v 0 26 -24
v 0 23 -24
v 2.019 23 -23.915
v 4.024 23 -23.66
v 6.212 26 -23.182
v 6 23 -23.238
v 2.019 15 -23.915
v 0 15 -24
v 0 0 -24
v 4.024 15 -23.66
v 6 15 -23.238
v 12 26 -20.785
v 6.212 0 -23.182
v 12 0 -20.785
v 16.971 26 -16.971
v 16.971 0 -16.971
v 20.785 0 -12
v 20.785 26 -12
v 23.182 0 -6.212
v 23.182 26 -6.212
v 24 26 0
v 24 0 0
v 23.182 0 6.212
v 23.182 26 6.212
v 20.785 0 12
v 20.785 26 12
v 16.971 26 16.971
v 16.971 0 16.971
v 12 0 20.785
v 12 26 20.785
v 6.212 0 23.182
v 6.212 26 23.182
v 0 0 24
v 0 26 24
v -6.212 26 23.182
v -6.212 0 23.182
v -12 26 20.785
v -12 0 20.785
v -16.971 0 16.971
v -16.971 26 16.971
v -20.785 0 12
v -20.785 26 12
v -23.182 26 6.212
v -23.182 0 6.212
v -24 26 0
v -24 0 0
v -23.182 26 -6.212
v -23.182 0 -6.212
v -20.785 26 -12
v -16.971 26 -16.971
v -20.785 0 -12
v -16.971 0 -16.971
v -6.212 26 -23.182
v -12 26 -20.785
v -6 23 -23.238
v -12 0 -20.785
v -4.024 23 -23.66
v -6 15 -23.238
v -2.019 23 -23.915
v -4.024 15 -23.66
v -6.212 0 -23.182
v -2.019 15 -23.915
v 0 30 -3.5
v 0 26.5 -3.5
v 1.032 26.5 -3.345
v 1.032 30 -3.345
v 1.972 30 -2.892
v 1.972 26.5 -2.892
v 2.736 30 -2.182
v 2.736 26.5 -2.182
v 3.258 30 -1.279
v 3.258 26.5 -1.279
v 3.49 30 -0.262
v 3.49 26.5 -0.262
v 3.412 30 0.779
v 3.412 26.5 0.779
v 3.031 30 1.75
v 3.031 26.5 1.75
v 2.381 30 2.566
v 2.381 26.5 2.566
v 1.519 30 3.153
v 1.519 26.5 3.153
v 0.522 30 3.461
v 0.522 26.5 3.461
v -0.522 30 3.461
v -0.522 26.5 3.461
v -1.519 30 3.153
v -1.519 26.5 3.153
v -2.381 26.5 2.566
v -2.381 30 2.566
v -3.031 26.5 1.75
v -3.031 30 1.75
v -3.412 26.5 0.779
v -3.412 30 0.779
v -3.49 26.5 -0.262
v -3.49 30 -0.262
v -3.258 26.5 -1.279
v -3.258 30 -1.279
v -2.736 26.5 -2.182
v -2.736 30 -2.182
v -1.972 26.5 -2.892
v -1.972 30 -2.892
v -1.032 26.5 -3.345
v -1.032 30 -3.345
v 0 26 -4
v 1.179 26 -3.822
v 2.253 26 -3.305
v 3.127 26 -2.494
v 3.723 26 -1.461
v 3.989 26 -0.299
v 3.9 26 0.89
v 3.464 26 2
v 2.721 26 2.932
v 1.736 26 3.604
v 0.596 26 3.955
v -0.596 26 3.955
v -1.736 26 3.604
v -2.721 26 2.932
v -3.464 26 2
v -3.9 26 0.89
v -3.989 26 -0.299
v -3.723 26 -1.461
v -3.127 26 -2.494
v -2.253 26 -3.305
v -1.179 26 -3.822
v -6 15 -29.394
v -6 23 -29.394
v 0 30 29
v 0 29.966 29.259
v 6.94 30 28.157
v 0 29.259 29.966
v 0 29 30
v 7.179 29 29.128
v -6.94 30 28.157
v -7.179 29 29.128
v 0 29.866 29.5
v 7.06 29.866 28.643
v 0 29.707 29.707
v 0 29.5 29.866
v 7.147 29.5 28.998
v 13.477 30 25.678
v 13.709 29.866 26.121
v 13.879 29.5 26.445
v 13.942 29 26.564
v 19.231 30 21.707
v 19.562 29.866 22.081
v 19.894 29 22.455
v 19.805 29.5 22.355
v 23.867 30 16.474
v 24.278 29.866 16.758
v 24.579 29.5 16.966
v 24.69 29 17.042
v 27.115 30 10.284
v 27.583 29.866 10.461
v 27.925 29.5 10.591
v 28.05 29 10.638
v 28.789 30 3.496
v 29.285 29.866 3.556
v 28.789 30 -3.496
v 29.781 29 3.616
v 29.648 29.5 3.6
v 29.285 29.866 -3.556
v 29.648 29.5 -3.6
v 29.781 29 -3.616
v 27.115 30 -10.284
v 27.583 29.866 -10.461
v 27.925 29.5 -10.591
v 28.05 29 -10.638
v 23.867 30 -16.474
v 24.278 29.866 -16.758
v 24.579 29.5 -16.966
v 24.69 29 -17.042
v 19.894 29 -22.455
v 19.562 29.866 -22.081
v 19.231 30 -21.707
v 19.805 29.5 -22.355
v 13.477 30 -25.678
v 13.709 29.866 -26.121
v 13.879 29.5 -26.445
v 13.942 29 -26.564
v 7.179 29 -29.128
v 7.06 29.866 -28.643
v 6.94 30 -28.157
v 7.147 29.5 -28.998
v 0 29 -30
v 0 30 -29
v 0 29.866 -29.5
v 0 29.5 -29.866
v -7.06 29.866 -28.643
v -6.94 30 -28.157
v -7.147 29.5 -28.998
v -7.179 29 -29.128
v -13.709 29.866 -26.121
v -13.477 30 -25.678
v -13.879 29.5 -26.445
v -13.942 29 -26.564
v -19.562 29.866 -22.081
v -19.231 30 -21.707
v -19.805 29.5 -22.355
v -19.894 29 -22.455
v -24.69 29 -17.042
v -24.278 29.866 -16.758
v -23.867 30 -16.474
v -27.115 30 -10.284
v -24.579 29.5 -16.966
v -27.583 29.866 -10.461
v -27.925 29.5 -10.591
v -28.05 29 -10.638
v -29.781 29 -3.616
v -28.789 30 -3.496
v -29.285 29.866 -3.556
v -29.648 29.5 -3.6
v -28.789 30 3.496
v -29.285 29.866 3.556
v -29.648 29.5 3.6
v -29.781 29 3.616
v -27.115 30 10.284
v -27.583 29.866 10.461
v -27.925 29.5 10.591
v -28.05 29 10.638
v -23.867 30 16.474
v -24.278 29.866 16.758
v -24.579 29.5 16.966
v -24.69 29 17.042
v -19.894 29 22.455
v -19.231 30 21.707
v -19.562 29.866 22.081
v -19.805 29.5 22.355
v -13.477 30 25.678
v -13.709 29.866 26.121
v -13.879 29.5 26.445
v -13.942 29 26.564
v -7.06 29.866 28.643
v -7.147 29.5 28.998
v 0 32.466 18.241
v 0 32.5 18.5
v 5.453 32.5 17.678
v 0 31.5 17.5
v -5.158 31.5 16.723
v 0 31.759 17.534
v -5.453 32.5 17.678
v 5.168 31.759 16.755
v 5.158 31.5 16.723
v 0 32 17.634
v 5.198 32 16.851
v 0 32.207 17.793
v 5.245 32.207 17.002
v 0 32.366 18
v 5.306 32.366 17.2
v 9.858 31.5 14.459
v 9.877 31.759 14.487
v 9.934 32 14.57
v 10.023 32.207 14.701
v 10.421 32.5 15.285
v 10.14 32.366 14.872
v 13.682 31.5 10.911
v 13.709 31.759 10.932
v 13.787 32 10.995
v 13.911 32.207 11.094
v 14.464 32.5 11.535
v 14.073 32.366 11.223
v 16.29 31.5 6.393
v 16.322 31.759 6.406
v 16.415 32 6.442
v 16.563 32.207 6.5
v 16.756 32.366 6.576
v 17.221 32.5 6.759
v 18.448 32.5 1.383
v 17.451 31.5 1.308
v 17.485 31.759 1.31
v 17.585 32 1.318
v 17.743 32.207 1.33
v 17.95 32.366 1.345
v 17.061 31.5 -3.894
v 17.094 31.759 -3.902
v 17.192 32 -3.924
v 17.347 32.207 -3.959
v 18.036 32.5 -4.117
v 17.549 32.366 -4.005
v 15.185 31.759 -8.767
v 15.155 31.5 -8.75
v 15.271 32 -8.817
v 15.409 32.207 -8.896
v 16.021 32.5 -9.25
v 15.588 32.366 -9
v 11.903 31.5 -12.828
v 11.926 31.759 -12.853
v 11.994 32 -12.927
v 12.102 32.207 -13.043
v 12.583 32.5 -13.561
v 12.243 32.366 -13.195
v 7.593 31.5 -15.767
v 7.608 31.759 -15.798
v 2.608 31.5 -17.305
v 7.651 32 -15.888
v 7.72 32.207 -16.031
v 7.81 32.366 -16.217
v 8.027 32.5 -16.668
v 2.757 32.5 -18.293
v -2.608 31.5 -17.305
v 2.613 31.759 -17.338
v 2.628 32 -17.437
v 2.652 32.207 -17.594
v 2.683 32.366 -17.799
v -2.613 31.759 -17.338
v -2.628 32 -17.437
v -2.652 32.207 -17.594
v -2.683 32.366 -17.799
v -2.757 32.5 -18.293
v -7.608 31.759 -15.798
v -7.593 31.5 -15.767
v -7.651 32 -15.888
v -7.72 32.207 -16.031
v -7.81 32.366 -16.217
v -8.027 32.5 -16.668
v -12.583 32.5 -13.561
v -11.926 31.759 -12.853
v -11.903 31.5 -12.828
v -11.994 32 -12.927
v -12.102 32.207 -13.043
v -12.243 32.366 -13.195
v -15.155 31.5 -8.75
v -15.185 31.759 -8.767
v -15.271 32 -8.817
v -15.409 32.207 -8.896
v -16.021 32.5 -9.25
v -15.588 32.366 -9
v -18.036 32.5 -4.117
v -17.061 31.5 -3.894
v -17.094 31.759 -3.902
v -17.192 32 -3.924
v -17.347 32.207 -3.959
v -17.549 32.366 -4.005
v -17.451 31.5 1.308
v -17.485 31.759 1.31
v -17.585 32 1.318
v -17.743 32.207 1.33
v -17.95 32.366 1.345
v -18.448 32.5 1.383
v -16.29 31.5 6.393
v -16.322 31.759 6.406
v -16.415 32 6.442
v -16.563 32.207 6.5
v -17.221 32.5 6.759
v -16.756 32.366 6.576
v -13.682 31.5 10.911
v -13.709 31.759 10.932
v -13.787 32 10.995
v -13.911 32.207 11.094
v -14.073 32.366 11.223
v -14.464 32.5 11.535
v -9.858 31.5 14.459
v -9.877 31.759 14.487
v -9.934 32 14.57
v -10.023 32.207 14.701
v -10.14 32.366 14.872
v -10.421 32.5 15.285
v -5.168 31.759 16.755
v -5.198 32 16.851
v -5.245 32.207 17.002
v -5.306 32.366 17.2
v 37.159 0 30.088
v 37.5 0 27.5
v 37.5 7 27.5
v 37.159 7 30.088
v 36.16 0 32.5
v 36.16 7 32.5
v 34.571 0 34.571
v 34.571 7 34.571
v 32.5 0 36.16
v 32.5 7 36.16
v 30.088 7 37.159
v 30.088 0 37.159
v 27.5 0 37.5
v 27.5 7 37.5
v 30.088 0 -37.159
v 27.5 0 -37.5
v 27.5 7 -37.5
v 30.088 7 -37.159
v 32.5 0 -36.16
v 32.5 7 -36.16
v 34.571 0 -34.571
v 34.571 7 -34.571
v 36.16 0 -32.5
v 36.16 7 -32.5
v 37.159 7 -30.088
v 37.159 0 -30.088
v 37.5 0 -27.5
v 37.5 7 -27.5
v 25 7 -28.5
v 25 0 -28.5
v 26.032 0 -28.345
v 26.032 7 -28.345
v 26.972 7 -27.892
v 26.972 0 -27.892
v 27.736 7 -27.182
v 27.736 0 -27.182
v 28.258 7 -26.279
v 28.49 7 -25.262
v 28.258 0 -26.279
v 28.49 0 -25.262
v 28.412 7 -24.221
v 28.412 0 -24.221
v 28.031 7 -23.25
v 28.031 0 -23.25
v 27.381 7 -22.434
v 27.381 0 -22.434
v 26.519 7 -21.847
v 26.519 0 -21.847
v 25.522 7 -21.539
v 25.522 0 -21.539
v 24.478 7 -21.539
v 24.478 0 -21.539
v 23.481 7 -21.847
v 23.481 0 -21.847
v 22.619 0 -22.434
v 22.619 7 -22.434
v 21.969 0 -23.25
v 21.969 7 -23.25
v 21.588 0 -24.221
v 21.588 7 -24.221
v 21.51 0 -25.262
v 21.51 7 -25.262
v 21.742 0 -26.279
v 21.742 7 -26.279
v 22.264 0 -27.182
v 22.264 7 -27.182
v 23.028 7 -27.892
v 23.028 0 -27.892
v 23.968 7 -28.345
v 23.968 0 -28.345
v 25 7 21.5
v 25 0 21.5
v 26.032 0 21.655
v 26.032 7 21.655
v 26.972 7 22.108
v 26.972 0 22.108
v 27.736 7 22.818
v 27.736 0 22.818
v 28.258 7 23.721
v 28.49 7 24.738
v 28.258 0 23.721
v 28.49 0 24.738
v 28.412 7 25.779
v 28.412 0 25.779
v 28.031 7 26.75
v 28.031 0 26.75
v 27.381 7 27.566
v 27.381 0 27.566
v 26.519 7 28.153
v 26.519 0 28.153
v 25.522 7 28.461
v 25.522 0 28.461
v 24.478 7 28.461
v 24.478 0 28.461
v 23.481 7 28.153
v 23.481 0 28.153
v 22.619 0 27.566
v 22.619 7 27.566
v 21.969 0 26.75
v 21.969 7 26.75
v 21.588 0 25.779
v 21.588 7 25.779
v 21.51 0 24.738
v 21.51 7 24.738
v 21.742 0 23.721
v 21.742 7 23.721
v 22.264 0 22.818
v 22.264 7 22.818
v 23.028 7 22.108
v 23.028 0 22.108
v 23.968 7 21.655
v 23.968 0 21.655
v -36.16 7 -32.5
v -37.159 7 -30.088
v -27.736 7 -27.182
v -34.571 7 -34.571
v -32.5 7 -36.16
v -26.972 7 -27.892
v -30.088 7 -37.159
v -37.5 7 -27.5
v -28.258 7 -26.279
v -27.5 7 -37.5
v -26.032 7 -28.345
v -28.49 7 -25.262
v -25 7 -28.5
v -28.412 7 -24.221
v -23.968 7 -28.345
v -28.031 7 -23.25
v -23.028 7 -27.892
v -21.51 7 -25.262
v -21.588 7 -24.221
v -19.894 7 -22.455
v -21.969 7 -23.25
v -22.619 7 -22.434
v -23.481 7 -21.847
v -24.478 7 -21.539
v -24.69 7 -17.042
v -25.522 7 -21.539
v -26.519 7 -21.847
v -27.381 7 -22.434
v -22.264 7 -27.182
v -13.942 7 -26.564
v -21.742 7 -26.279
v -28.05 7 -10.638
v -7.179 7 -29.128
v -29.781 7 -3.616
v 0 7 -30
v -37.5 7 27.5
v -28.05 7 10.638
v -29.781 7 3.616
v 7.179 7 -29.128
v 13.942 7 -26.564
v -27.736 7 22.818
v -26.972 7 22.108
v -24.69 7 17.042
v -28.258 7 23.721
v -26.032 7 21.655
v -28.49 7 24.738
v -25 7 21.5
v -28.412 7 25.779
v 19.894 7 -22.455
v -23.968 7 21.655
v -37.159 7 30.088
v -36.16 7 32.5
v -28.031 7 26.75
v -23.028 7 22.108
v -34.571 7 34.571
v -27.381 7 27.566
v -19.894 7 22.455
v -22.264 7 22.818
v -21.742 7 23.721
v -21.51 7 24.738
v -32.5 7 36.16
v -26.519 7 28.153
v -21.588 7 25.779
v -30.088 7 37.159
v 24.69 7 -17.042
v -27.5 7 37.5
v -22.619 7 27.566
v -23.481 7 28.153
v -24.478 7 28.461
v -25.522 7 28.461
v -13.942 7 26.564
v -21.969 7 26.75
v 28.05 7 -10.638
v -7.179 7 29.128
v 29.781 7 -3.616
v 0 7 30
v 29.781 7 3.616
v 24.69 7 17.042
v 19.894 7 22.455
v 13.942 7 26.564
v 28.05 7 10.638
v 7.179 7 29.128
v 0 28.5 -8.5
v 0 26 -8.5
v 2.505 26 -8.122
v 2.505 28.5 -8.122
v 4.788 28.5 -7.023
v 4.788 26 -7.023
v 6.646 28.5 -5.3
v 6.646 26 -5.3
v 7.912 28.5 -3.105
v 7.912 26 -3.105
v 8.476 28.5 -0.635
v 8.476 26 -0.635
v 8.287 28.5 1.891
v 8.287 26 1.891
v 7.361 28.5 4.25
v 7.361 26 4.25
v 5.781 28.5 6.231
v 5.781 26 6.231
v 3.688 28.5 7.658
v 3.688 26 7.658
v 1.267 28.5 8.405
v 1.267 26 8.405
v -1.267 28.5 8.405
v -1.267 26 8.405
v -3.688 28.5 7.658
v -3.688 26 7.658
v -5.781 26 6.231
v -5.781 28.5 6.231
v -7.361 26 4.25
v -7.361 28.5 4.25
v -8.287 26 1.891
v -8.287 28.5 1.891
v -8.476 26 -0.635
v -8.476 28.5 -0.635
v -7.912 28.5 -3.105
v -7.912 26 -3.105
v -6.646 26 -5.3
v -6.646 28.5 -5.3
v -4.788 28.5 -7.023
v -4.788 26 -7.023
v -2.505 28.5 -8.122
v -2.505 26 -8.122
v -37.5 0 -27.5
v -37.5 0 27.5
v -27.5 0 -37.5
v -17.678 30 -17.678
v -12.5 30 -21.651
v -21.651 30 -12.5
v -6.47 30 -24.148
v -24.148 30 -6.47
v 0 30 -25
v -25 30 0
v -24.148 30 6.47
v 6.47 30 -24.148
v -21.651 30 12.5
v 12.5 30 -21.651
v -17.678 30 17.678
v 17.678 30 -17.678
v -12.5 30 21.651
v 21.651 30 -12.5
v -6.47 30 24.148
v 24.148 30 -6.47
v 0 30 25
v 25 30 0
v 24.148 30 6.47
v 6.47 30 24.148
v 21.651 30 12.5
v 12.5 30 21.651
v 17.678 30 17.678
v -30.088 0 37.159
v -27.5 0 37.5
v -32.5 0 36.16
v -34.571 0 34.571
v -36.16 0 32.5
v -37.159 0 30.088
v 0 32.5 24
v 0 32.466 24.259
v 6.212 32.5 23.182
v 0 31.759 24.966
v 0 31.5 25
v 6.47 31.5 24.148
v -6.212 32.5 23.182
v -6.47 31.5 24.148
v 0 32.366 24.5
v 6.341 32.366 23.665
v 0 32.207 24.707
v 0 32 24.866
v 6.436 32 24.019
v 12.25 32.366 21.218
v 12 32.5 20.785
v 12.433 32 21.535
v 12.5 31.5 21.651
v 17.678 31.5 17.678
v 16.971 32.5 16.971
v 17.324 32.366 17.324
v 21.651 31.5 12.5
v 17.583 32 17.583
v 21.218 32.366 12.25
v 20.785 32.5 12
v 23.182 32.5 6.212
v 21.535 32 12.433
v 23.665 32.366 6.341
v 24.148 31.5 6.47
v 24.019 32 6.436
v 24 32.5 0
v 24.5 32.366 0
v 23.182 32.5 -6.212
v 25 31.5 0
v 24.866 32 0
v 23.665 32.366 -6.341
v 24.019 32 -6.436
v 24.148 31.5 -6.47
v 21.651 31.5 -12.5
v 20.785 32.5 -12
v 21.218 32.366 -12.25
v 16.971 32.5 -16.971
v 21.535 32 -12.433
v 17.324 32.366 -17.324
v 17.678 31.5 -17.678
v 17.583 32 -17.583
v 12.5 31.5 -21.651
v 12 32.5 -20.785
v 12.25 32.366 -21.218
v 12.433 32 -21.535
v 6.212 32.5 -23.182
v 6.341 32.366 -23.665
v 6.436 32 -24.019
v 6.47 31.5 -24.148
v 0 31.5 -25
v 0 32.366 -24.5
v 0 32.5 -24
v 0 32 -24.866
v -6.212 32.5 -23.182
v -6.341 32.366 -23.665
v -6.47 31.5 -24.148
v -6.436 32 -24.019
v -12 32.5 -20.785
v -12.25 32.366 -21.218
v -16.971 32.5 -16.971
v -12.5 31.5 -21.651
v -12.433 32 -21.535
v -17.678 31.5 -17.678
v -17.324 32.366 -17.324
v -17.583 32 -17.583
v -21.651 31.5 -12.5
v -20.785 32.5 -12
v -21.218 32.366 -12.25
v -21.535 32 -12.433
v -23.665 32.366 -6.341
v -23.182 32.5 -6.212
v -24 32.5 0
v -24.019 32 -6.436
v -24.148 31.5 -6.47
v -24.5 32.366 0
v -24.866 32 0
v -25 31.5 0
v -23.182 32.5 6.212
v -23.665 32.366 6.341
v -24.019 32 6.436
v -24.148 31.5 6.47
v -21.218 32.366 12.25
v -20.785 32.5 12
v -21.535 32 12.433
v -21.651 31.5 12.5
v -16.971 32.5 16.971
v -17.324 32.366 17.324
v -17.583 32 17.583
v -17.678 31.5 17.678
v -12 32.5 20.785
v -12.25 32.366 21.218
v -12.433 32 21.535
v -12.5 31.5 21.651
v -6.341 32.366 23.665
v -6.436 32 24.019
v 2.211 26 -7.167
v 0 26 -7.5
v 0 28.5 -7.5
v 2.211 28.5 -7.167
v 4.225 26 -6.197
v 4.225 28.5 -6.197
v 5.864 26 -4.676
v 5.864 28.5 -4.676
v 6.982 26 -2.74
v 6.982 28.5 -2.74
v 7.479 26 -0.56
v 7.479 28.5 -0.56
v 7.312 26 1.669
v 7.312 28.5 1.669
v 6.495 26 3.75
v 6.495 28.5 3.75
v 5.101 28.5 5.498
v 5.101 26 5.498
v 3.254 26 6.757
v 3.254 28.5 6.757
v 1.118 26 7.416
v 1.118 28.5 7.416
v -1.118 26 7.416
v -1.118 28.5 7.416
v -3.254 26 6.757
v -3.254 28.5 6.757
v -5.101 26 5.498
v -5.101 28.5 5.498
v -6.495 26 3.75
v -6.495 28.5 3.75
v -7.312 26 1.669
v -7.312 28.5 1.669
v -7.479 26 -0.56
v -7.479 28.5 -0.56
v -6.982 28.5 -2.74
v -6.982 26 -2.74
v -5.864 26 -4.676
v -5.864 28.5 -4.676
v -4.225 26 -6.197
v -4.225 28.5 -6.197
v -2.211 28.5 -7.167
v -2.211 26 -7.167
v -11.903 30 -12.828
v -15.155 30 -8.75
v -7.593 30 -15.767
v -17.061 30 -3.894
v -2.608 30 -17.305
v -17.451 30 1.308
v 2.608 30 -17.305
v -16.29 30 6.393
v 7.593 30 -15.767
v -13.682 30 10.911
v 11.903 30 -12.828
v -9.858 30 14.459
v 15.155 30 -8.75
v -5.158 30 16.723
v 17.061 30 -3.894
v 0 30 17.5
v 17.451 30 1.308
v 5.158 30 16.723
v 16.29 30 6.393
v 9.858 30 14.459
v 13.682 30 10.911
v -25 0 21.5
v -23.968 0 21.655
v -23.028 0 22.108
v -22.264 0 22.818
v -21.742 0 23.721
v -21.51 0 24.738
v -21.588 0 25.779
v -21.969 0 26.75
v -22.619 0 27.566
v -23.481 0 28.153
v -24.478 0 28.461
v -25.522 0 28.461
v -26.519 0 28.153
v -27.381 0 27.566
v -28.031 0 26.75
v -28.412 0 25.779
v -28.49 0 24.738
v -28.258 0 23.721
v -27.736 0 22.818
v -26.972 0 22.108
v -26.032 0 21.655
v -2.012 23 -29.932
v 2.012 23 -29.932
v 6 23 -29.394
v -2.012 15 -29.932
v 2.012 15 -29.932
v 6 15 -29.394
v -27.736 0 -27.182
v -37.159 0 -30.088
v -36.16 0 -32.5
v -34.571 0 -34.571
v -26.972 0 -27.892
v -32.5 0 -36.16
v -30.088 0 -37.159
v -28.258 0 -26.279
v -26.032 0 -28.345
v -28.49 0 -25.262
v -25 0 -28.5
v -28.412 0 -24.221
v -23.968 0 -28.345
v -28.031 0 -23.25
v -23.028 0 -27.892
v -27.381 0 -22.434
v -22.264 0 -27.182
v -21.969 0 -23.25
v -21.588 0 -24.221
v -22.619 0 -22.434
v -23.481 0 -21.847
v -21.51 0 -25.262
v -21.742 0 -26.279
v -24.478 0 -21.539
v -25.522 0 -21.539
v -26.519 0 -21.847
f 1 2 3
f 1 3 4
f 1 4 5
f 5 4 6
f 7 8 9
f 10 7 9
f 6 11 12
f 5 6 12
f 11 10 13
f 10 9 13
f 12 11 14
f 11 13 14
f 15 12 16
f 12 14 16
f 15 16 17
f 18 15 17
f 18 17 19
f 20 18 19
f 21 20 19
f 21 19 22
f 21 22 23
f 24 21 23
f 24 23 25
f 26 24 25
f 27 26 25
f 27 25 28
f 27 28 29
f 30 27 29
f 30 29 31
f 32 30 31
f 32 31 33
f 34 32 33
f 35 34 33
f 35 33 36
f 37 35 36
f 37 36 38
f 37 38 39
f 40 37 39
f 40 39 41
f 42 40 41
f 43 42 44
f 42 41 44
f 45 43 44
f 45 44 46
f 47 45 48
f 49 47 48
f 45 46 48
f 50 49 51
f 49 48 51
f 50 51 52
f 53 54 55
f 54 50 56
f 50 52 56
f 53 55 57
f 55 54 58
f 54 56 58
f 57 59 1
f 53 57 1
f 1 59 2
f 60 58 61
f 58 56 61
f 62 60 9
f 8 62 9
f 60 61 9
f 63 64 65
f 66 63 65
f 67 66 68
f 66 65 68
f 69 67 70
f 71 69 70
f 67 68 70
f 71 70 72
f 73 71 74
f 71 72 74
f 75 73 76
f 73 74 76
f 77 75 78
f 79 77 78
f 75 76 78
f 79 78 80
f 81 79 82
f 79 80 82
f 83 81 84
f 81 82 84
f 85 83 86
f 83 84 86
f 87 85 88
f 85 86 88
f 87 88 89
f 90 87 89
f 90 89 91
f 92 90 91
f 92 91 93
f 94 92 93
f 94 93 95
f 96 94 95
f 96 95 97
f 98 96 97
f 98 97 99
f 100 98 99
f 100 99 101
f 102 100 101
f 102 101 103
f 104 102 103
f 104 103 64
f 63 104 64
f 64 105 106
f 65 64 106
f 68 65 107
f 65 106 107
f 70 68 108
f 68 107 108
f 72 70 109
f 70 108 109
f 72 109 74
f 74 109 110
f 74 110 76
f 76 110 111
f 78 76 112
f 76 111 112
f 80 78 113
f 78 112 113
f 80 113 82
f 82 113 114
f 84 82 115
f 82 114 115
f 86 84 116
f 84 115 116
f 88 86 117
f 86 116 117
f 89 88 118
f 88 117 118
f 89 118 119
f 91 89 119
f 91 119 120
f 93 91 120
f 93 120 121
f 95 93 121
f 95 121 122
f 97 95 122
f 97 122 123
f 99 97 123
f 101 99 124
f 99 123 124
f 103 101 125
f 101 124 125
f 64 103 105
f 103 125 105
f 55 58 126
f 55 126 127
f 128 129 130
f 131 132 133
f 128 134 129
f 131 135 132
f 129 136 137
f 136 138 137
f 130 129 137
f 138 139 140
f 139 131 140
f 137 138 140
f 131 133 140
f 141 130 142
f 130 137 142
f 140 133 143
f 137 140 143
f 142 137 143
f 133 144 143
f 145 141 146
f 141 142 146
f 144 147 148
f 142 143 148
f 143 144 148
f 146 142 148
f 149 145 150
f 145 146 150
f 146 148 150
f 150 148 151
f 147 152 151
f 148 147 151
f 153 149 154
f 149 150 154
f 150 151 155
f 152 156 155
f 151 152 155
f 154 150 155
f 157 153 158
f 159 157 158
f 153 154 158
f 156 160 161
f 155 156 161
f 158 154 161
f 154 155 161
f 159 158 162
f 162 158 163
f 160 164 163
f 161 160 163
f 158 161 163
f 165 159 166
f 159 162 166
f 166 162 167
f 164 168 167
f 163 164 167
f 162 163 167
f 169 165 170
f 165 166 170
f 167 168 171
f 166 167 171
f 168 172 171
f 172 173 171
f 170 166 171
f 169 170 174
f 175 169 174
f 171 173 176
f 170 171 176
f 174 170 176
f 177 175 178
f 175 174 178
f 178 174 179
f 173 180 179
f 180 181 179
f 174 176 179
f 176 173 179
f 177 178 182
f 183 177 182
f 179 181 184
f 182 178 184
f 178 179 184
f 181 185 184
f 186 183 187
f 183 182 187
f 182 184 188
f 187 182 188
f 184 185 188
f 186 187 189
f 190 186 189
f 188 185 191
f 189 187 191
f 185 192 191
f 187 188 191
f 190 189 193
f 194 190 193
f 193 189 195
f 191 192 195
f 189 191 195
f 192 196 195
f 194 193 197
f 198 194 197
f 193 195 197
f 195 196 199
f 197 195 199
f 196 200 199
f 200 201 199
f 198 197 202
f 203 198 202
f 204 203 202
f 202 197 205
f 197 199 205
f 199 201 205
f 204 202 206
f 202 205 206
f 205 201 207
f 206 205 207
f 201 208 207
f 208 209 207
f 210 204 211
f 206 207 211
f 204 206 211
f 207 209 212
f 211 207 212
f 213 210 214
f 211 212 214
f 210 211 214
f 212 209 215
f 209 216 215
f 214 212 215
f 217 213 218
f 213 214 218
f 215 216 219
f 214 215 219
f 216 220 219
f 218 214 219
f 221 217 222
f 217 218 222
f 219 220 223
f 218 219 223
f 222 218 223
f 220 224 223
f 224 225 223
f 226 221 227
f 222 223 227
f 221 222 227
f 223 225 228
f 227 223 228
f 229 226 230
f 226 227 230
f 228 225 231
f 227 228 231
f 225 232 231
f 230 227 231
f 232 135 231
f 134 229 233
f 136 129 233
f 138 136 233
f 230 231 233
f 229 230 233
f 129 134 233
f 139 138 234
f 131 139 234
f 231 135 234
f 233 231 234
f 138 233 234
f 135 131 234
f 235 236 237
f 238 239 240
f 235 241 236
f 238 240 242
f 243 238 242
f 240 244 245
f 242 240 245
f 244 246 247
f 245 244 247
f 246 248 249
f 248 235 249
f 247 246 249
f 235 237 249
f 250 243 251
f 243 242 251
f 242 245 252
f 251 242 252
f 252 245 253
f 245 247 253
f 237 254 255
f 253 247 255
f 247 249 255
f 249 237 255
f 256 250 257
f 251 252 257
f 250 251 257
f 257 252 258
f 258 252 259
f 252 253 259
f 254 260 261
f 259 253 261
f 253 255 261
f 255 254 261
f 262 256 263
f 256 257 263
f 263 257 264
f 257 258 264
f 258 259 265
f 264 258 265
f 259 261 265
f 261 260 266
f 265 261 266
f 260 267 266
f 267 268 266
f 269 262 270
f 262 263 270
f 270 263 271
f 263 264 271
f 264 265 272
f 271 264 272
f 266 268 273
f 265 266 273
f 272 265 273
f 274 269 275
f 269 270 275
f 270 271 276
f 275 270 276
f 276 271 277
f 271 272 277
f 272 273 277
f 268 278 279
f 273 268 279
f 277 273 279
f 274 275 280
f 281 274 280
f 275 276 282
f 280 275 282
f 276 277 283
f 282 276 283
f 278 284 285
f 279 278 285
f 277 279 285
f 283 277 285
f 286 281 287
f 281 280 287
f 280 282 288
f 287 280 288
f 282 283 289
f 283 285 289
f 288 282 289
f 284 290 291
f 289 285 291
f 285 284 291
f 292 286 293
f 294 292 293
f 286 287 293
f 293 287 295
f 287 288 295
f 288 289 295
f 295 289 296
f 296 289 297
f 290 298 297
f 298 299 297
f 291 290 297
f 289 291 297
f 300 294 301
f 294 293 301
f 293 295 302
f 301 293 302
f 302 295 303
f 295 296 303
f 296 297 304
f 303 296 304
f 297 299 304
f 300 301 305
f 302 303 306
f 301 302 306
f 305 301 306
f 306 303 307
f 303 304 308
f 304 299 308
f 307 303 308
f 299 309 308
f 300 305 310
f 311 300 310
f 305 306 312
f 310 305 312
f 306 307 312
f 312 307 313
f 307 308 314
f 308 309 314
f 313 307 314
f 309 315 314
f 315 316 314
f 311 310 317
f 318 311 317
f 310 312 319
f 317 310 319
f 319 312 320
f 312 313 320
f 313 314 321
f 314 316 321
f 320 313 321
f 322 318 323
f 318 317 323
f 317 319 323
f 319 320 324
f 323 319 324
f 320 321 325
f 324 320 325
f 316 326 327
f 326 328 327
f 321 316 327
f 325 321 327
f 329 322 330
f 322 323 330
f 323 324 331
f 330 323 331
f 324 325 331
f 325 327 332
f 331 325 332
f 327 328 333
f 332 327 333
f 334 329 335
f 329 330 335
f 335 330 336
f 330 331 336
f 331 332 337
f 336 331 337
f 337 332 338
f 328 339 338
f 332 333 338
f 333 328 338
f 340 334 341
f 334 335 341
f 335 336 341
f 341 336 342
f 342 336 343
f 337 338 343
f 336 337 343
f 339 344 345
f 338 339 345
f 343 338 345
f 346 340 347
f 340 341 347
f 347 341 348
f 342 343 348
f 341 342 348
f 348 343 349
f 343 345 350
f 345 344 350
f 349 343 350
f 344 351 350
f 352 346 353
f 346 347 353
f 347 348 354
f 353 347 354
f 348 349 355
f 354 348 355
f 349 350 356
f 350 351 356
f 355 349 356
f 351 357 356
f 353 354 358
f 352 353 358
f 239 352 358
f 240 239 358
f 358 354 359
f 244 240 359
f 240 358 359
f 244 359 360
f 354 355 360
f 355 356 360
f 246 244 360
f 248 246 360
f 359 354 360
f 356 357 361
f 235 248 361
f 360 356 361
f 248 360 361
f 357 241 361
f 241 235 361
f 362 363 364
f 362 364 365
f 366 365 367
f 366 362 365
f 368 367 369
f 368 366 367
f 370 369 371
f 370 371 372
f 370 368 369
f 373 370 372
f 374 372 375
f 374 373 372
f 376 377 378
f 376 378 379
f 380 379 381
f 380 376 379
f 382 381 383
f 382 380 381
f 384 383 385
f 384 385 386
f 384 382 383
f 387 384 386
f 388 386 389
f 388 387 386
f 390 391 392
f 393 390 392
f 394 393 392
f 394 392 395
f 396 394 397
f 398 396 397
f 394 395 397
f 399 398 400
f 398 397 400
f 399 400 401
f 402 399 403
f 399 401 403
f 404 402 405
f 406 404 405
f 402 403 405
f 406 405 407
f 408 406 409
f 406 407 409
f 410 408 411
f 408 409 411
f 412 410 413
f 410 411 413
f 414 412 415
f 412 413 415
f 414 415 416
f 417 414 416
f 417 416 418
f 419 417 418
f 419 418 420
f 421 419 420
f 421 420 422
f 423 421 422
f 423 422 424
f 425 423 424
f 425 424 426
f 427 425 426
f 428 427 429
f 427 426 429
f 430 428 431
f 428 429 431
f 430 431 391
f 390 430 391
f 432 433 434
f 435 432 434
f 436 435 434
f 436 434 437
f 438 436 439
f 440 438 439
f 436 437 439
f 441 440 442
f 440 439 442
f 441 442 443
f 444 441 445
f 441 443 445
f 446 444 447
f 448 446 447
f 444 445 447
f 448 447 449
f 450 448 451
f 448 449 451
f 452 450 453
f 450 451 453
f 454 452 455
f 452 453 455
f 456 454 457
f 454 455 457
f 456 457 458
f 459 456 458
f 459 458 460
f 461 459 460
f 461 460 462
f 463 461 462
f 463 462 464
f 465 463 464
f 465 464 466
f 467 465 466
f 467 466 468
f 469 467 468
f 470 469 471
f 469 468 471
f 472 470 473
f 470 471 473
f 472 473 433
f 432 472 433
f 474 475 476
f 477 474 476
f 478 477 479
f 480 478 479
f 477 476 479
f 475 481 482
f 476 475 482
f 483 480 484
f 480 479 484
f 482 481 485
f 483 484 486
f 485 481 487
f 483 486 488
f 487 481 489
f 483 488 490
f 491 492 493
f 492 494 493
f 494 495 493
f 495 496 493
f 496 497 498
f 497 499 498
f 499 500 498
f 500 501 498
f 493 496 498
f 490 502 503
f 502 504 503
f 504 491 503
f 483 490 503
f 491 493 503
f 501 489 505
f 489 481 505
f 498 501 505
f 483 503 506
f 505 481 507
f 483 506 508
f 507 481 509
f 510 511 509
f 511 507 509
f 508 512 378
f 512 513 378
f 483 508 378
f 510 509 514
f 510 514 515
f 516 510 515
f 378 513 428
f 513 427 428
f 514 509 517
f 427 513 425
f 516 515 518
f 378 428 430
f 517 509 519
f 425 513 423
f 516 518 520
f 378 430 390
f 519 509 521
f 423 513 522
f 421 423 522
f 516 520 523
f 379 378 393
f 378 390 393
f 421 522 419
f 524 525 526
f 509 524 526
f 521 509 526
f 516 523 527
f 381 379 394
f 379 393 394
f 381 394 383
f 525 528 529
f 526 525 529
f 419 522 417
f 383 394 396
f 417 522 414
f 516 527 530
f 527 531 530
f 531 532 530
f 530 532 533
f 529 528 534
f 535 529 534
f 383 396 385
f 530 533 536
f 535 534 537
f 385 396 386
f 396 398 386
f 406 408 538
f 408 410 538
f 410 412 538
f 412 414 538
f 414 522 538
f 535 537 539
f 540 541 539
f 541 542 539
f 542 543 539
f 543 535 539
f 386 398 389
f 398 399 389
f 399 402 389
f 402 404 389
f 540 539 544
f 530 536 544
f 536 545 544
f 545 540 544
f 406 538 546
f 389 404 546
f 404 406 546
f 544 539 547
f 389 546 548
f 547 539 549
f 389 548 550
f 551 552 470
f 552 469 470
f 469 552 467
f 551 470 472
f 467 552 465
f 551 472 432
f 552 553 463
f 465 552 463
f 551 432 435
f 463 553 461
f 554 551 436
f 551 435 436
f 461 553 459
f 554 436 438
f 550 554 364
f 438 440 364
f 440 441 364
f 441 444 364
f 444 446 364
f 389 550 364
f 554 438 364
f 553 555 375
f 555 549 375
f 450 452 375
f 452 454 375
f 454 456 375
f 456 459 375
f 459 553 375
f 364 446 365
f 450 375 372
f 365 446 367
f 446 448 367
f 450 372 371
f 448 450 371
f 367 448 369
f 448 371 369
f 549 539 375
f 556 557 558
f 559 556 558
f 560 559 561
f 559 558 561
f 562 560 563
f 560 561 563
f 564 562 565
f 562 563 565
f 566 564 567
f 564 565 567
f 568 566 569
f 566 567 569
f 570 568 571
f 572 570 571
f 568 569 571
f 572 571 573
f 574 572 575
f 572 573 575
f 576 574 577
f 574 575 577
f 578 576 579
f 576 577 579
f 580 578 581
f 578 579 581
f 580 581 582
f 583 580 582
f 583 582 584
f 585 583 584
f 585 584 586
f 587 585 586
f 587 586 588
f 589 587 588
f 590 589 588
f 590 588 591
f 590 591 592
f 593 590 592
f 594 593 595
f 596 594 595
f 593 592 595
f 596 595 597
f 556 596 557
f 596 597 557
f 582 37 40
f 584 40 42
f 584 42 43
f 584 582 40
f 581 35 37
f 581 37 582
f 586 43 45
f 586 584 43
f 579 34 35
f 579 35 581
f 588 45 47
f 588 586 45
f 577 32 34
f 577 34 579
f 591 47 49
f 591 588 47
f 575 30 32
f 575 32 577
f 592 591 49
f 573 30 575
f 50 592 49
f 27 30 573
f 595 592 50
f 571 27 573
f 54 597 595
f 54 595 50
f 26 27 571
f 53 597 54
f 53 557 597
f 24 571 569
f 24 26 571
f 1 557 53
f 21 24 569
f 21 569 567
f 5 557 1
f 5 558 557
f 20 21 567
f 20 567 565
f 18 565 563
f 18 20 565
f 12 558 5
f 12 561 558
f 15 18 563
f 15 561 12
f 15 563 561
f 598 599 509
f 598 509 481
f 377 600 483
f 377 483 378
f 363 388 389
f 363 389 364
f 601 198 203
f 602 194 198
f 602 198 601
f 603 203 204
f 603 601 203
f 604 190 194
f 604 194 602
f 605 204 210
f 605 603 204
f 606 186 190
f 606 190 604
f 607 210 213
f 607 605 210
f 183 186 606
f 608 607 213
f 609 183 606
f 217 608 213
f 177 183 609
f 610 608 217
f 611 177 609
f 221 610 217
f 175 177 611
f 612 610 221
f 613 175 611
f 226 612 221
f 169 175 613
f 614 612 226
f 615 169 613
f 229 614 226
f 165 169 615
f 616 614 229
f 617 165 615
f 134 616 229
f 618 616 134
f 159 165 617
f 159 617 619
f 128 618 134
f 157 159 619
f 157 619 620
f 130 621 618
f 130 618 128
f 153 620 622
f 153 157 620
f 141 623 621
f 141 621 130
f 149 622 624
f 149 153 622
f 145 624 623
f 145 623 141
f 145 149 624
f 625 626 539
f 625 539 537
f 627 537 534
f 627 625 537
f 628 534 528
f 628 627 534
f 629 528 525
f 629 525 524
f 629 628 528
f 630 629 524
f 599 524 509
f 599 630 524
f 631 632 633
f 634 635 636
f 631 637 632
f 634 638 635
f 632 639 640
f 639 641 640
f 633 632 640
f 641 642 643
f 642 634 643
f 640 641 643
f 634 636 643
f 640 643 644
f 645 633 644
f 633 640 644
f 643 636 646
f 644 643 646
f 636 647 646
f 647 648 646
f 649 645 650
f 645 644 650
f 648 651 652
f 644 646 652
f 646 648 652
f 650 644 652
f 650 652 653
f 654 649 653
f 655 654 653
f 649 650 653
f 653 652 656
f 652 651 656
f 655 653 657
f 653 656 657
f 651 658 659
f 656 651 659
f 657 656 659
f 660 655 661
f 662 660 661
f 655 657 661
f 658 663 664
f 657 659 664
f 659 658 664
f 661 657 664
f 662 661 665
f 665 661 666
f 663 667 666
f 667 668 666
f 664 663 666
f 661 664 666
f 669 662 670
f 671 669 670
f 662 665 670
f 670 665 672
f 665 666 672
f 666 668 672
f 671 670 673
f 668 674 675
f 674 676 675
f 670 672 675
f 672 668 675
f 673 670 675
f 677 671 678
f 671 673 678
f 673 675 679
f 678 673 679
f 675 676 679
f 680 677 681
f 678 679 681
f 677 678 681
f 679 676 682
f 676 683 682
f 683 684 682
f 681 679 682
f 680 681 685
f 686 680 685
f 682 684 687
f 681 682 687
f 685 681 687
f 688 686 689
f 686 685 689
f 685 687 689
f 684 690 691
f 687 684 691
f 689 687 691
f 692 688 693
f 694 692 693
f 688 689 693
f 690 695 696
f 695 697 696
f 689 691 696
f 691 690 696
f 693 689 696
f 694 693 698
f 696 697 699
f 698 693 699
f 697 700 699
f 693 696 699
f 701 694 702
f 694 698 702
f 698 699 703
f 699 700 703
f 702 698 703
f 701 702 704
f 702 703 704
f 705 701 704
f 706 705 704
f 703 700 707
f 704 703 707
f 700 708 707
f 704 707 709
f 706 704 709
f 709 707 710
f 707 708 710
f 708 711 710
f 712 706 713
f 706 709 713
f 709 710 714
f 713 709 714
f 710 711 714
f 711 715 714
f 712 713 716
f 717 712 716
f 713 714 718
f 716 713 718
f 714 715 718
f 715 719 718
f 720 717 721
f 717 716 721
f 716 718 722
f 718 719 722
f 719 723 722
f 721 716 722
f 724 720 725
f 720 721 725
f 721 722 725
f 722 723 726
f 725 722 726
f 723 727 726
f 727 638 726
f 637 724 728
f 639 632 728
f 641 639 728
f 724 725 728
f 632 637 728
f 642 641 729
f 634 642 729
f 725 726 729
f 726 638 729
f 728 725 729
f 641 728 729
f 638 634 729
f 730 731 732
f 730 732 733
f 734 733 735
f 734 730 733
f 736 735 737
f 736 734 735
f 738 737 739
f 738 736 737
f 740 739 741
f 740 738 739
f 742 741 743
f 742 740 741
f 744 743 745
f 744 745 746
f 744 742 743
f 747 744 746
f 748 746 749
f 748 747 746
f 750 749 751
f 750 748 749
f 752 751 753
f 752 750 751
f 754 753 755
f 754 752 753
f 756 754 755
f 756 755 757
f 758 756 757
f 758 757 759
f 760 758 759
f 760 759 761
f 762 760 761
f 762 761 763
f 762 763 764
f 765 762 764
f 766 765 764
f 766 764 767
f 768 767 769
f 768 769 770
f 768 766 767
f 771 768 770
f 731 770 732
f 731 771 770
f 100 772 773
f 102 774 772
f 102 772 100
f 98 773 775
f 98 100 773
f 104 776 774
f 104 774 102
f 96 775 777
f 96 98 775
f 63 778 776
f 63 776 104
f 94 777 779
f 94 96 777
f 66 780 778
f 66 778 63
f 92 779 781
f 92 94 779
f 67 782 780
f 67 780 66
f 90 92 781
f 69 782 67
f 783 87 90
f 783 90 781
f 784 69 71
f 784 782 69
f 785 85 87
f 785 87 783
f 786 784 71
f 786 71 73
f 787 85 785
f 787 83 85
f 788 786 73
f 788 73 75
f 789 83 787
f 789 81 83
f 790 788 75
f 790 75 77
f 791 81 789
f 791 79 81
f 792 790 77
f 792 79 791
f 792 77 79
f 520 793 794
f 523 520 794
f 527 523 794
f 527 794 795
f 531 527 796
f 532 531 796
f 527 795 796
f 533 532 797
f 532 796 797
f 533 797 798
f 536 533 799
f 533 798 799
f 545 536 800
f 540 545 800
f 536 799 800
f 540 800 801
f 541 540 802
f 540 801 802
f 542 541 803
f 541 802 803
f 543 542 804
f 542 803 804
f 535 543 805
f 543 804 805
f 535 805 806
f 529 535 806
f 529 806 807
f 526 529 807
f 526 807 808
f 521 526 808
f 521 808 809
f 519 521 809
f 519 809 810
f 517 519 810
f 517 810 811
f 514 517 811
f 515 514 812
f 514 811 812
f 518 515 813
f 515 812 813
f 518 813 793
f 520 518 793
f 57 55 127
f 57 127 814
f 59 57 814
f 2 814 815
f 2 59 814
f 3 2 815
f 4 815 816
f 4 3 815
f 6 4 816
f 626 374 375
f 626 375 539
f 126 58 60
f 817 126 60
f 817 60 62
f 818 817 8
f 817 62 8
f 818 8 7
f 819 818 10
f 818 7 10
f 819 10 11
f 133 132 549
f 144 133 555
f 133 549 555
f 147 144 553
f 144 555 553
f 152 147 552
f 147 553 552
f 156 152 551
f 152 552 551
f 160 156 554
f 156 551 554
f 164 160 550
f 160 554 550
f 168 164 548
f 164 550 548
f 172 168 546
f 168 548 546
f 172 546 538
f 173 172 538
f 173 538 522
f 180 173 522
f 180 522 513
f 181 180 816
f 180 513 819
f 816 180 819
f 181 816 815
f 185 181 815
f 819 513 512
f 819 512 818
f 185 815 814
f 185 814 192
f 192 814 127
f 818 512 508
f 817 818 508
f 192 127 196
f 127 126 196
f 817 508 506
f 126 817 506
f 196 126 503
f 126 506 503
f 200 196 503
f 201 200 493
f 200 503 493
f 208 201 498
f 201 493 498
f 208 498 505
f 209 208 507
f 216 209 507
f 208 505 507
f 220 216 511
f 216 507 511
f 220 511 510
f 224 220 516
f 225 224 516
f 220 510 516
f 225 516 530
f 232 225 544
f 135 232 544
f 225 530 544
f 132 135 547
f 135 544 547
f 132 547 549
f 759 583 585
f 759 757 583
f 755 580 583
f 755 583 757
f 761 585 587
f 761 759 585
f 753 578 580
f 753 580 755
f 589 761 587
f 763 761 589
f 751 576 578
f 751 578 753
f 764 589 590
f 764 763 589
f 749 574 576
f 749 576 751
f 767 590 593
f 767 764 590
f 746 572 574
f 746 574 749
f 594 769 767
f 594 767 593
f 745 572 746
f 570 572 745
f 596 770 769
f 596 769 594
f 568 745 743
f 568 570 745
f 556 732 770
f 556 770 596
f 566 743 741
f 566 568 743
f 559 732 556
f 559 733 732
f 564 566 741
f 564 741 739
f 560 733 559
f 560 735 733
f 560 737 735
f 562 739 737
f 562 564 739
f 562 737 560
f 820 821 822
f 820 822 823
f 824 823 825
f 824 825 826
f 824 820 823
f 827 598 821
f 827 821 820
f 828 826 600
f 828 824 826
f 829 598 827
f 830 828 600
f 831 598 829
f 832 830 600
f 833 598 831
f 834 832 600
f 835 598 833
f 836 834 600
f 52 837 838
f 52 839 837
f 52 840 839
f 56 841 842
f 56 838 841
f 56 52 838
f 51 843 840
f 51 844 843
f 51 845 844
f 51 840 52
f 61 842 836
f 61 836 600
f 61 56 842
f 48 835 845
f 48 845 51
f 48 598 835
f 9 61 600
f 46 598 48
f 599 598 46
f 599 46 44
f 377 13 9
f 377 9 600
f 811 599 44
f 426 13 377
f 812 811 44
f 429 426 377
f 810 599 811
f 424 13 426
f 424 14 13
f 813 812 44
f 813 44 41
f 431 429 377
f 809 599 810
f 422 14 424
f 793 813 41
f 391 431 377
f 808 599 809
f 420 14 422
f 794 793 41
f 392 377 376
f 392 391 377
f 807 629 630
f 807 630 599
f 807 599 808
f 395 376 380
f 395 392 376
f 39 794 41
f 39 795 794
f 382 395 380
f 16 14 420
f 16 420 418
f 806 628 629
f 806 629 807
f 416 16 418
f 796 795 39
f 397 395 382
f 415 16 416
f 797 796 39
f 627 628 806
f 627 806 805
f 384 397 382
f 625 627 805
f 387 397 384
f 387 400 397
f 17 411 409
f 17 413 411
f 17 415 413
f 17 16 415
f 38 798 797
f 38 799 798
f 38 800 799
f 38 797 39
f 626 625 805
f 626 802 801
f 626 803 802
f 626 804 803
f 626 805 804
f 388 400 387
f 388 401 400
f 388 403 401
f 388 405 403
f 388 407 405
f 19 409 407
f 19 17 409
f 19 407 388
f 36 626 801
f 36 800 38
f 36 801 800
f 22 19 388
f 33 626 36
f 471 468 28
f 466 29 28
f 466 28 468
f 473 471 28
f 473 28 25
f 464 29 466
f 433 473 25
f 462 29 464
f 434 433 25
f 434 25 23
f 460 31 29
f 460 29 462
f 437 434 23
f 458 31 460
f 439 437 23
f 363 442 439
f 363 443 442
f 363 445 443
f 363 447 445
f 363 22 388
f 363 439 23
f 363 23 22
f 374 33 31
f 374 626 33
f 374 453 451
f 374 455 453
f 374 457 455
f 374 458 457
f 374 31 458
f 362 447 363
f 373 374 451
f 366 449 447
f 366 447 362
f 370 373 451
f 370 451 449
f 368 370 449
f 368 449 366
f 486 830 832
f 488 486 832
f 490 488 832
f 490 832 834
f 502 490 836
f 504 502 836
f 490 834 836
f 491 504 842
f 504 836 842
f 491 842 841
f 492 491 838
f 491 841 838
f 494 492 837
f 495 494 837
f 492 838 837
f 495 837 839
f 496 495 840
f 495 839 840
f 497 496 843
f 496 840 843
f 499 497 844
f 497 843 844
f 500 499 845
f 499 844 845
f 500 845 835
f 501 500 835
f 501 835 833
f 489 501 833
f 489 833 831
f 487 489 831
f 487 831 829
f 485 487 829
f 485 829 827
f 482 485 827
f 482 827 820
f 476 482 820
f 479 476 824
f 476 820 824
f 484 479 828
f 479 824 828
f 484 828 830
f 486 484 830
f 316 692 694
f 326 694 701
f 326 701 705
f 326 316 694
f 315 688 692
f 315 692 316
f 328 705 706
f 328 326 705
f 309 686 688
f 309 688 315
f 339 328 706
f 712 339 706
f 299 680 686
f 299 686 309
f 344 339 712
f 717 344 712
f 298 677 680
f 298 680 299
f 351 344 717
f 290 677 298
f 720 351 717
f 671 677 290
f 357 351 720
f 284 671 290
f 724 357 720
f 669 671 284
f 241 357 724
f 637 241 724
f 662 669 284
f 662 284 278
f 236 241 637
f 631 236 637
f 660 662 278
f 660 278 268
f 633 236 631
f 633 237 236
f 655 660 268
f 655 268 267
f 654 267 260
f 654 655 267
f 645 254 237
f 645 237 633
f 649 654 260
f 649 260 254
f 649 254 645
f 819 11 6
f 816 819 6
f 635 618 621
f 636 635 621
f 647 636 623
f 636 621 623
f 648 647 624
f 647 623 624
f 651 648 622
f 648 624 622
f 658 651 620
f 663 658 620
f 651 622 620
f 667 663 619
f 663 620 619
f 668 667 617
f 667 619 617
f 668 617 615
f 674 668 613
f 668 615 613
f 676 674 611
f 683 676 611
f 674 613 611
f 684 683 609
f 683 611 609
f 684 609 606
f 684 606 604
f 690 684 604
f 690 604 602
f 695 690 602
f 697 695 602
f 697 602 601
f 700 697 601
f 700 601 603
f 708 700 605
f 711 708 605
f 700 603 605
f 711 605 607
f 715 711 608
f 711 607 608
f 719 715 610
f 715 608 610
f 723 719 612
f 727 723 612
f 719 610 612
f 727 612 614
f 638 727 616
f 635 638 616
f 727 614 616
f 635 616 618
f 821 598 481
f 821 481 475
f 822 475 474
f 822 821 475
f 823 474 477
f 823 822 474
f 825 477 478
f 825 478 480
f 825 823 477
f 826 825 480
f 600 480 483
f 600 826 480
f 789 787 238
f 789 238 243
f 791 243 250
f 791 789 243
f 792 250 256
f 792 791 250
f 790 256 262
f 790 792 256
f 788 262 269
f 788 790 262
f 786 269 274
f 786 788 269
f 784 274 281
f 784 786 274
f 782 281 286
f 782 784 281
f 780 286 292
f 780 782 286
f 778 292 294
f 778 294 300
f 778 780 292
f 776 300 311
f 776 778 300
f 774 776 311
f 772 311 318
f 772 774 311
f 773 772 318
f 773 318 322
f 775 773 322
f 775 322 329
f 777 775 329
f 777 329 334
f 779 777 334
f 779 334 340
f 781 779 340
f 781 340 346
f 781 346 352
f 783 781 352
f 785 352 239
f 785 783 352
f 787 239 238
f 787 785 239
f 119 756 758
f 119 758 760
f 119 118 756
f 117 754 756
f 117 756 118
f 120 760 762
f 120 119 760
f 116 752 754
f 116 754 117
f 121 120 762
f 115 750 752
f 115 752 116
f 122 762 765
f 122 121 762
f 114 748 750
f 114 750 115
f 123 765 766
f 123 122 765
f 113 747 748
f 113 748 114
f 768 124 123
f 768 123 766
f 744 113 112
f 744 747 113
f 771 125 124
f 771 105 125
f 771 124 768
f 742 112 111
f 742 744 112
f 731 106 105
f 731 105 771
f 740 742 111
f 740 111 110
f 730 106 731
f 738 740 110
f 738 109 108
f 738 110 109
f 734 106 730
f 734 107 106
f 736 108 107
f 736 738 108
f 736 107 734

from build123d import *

# Parameters (mm, degrees)
SKETCH_1_R          = 30
EXTRUDE_1_DEPTH     = 30
SKETCH_2_R          = 3.5
EXTRUDE_2_DEPTH     = 7
SKETCH_3_R          = 24
CUT_EXTRUDE_1_DEPTH = 26
SKETCH_4_R          = 3.5
CUT_EXTRUDE_2_DEPTH = 60.063525123
SKETCH_5_R          = 8.5
SKETCH_5_R_2        = 7.5
CUT_EXTRUDE_3_DEPTH = 2.5
CHAMFER_1_SIZE      = 0.5
SKETCH_10_W         = 12
SKETCH_10_H         = 8
CUT_EXTRUDE_4_DEPTH = 49
SKETCH_11_R         = 25
SKETCH_11_R_2       = 17.5
EXTRUDE_3_DEPTH     = 2.5
FILLET_1_R          = 1


with BuildPart() as part:
    # 草图1 → 凸台-拉伸1 (new body)
    with BuildSketch(Plane(origin=(0, 0, 0), x_dir=(1, 0, 0), z_dir=(0, 1, 0))):
        with Locations(Location((0, 0, 0), (0, 0, 270))):
            Circle(SKETCH_1_R)
    extrude(amount=EXTRUDE_1_DEPTH)

    # 草图2 → 凸台-拉伸2 (add)
    with BuildSketch(Plane.XZ):
        with BuildLine():
            Line((-27.5, -37.5), (27.5, -37.5))
            ThreePointArc((27.5, -37.5), (34.571067812, -34.571067812), (37.5, -27.5))
            Line((37.5, -27.5), (37.5, 27.5))
            ThreePointArc((37.5, 27.5), (34.571067812, 34.571067812), (27.5, 37.5))
            Line((27.5, 37.5), (-27.5, 37.5))
            ThreePointArc((-27.5, 37.5), (-34.571067812, 34.571067812), (-37.5, 27.5))
            Line((-37.5, 27.5), (-37.5, -27.5))
            ThreePointArc((-37.5, -27.5), (-34.571067812, -34.571067812), (-27.5, -37.5))
        make_face()
        with Locations(Location((-24.999998784, 24.999998784, 0), (0, 0, 270))):
            Circle(SKETCH_2_R, mode=Mode.SUBTRACT)
        with Locations(Location((-25.000001216, -25.000001216, 0), (0, 0, 270))):
            Circle(SKETCH_2_R, mode=Mode.SUBTRACT)
        with Locations(Location((25.000001216, 25.000001216, 0), (0, 0, 270))):
            Circle(SKETCH_2_R, mode=Mode.SUBTRACT)
        with Locations(Location((24.999998784, -24.999998784, 0), (0, 0, 270))):
            Circle(SKETCH_2_R, mode=Mode.SUBTRACT)
    extrude(amount=-EXTRUDE_2_DEPTH)

    # 草图3 → 切除-拉伸1 (cut)
    with BuildSketch(Plane.XZ):
        with Locations(Location((0, 0, 0), (0, 0, 270))):
            Circle(SKETCH_3_R)
    extrude(amount=-CUT_EXTRUDE_1_DEPTH, mode=Mode.SUBTRACT)

    # 草图4 → 切除-拉伸2 (cut, through all)
    with BuildSketch(Plane.XZ.offset(-26)):
        with Locations(Location((0, 0, 0), (0, 0, 270))):
            Circle(SKETCH_4_R)
    extrude(amount=-CUT_EXTRUDE_2_DEPTH, mode=Mode.SUBTRACT)

    # 草图5 → 切除-拉伸3 (cut)
    with BuildSketch(Plane.XZ.offset(-26)):
        with Locations(Location((0, 0, 0), (0, 0, 270))):
            Circle(SKETCH_5_R)
        with Locations(Location((0, 0, 0), (0, 0, 270))):
            Circle(SKETCH_5_R_2, mode=Mode.SUBTRACT)
    extrude(amount=-CUT_EXTRUDE_3_DEPTH, mode=Mode.SUBTRACT)

    # 倒角1
    chamfer_1_edges = [part.edges().sort_by_distance(p)[0] for p in [
        (0, 26, 3.5),
    ]]
    chamfer(chamfer_1_edges, length=CHAMFER_1_SIZE)

    # 草图10 → 切除-拉伸4 (cut)
    with BuildSketch(Plane.XY):
        with Locations((0, 19)):
            Rectangle(SKETCH_10_W, SKETCH_10_H)
    extrude(amount=-CUT_EXTRUDE_4_DEPTH, mode=Mode.SUBTRACT)

    # 草图11 → 凸台-拉伸3 (add)
    with BuildSketch(Plane(origin=(0, 30, 0), x_dir=(1, 0, 0), z_dir=(0, 1, 0))):
        with Locations(Location((0, 0, 0), (0, 0, 270))):
            Circle(SKETCH_11_R)
        with Locations(Location((0, 0, 0), (0, 0, 270))):
            Circle(SKETCH_11_R_2, mode=Mode.SUBTRACT)
    extrude(amount=EXTRUDE_3_DEPTH)

    # 圆角1
    fillet_1_edges = [part.edges().sort_by_distance(p)[0] for p in [
        (0, 30, -30),
        (0, 32.5, -25),
        (0, 32.5, -17.5),
    ]]
    fillet(fillet_1_edges, radius=FILLET_1_R)


solid = part.part
